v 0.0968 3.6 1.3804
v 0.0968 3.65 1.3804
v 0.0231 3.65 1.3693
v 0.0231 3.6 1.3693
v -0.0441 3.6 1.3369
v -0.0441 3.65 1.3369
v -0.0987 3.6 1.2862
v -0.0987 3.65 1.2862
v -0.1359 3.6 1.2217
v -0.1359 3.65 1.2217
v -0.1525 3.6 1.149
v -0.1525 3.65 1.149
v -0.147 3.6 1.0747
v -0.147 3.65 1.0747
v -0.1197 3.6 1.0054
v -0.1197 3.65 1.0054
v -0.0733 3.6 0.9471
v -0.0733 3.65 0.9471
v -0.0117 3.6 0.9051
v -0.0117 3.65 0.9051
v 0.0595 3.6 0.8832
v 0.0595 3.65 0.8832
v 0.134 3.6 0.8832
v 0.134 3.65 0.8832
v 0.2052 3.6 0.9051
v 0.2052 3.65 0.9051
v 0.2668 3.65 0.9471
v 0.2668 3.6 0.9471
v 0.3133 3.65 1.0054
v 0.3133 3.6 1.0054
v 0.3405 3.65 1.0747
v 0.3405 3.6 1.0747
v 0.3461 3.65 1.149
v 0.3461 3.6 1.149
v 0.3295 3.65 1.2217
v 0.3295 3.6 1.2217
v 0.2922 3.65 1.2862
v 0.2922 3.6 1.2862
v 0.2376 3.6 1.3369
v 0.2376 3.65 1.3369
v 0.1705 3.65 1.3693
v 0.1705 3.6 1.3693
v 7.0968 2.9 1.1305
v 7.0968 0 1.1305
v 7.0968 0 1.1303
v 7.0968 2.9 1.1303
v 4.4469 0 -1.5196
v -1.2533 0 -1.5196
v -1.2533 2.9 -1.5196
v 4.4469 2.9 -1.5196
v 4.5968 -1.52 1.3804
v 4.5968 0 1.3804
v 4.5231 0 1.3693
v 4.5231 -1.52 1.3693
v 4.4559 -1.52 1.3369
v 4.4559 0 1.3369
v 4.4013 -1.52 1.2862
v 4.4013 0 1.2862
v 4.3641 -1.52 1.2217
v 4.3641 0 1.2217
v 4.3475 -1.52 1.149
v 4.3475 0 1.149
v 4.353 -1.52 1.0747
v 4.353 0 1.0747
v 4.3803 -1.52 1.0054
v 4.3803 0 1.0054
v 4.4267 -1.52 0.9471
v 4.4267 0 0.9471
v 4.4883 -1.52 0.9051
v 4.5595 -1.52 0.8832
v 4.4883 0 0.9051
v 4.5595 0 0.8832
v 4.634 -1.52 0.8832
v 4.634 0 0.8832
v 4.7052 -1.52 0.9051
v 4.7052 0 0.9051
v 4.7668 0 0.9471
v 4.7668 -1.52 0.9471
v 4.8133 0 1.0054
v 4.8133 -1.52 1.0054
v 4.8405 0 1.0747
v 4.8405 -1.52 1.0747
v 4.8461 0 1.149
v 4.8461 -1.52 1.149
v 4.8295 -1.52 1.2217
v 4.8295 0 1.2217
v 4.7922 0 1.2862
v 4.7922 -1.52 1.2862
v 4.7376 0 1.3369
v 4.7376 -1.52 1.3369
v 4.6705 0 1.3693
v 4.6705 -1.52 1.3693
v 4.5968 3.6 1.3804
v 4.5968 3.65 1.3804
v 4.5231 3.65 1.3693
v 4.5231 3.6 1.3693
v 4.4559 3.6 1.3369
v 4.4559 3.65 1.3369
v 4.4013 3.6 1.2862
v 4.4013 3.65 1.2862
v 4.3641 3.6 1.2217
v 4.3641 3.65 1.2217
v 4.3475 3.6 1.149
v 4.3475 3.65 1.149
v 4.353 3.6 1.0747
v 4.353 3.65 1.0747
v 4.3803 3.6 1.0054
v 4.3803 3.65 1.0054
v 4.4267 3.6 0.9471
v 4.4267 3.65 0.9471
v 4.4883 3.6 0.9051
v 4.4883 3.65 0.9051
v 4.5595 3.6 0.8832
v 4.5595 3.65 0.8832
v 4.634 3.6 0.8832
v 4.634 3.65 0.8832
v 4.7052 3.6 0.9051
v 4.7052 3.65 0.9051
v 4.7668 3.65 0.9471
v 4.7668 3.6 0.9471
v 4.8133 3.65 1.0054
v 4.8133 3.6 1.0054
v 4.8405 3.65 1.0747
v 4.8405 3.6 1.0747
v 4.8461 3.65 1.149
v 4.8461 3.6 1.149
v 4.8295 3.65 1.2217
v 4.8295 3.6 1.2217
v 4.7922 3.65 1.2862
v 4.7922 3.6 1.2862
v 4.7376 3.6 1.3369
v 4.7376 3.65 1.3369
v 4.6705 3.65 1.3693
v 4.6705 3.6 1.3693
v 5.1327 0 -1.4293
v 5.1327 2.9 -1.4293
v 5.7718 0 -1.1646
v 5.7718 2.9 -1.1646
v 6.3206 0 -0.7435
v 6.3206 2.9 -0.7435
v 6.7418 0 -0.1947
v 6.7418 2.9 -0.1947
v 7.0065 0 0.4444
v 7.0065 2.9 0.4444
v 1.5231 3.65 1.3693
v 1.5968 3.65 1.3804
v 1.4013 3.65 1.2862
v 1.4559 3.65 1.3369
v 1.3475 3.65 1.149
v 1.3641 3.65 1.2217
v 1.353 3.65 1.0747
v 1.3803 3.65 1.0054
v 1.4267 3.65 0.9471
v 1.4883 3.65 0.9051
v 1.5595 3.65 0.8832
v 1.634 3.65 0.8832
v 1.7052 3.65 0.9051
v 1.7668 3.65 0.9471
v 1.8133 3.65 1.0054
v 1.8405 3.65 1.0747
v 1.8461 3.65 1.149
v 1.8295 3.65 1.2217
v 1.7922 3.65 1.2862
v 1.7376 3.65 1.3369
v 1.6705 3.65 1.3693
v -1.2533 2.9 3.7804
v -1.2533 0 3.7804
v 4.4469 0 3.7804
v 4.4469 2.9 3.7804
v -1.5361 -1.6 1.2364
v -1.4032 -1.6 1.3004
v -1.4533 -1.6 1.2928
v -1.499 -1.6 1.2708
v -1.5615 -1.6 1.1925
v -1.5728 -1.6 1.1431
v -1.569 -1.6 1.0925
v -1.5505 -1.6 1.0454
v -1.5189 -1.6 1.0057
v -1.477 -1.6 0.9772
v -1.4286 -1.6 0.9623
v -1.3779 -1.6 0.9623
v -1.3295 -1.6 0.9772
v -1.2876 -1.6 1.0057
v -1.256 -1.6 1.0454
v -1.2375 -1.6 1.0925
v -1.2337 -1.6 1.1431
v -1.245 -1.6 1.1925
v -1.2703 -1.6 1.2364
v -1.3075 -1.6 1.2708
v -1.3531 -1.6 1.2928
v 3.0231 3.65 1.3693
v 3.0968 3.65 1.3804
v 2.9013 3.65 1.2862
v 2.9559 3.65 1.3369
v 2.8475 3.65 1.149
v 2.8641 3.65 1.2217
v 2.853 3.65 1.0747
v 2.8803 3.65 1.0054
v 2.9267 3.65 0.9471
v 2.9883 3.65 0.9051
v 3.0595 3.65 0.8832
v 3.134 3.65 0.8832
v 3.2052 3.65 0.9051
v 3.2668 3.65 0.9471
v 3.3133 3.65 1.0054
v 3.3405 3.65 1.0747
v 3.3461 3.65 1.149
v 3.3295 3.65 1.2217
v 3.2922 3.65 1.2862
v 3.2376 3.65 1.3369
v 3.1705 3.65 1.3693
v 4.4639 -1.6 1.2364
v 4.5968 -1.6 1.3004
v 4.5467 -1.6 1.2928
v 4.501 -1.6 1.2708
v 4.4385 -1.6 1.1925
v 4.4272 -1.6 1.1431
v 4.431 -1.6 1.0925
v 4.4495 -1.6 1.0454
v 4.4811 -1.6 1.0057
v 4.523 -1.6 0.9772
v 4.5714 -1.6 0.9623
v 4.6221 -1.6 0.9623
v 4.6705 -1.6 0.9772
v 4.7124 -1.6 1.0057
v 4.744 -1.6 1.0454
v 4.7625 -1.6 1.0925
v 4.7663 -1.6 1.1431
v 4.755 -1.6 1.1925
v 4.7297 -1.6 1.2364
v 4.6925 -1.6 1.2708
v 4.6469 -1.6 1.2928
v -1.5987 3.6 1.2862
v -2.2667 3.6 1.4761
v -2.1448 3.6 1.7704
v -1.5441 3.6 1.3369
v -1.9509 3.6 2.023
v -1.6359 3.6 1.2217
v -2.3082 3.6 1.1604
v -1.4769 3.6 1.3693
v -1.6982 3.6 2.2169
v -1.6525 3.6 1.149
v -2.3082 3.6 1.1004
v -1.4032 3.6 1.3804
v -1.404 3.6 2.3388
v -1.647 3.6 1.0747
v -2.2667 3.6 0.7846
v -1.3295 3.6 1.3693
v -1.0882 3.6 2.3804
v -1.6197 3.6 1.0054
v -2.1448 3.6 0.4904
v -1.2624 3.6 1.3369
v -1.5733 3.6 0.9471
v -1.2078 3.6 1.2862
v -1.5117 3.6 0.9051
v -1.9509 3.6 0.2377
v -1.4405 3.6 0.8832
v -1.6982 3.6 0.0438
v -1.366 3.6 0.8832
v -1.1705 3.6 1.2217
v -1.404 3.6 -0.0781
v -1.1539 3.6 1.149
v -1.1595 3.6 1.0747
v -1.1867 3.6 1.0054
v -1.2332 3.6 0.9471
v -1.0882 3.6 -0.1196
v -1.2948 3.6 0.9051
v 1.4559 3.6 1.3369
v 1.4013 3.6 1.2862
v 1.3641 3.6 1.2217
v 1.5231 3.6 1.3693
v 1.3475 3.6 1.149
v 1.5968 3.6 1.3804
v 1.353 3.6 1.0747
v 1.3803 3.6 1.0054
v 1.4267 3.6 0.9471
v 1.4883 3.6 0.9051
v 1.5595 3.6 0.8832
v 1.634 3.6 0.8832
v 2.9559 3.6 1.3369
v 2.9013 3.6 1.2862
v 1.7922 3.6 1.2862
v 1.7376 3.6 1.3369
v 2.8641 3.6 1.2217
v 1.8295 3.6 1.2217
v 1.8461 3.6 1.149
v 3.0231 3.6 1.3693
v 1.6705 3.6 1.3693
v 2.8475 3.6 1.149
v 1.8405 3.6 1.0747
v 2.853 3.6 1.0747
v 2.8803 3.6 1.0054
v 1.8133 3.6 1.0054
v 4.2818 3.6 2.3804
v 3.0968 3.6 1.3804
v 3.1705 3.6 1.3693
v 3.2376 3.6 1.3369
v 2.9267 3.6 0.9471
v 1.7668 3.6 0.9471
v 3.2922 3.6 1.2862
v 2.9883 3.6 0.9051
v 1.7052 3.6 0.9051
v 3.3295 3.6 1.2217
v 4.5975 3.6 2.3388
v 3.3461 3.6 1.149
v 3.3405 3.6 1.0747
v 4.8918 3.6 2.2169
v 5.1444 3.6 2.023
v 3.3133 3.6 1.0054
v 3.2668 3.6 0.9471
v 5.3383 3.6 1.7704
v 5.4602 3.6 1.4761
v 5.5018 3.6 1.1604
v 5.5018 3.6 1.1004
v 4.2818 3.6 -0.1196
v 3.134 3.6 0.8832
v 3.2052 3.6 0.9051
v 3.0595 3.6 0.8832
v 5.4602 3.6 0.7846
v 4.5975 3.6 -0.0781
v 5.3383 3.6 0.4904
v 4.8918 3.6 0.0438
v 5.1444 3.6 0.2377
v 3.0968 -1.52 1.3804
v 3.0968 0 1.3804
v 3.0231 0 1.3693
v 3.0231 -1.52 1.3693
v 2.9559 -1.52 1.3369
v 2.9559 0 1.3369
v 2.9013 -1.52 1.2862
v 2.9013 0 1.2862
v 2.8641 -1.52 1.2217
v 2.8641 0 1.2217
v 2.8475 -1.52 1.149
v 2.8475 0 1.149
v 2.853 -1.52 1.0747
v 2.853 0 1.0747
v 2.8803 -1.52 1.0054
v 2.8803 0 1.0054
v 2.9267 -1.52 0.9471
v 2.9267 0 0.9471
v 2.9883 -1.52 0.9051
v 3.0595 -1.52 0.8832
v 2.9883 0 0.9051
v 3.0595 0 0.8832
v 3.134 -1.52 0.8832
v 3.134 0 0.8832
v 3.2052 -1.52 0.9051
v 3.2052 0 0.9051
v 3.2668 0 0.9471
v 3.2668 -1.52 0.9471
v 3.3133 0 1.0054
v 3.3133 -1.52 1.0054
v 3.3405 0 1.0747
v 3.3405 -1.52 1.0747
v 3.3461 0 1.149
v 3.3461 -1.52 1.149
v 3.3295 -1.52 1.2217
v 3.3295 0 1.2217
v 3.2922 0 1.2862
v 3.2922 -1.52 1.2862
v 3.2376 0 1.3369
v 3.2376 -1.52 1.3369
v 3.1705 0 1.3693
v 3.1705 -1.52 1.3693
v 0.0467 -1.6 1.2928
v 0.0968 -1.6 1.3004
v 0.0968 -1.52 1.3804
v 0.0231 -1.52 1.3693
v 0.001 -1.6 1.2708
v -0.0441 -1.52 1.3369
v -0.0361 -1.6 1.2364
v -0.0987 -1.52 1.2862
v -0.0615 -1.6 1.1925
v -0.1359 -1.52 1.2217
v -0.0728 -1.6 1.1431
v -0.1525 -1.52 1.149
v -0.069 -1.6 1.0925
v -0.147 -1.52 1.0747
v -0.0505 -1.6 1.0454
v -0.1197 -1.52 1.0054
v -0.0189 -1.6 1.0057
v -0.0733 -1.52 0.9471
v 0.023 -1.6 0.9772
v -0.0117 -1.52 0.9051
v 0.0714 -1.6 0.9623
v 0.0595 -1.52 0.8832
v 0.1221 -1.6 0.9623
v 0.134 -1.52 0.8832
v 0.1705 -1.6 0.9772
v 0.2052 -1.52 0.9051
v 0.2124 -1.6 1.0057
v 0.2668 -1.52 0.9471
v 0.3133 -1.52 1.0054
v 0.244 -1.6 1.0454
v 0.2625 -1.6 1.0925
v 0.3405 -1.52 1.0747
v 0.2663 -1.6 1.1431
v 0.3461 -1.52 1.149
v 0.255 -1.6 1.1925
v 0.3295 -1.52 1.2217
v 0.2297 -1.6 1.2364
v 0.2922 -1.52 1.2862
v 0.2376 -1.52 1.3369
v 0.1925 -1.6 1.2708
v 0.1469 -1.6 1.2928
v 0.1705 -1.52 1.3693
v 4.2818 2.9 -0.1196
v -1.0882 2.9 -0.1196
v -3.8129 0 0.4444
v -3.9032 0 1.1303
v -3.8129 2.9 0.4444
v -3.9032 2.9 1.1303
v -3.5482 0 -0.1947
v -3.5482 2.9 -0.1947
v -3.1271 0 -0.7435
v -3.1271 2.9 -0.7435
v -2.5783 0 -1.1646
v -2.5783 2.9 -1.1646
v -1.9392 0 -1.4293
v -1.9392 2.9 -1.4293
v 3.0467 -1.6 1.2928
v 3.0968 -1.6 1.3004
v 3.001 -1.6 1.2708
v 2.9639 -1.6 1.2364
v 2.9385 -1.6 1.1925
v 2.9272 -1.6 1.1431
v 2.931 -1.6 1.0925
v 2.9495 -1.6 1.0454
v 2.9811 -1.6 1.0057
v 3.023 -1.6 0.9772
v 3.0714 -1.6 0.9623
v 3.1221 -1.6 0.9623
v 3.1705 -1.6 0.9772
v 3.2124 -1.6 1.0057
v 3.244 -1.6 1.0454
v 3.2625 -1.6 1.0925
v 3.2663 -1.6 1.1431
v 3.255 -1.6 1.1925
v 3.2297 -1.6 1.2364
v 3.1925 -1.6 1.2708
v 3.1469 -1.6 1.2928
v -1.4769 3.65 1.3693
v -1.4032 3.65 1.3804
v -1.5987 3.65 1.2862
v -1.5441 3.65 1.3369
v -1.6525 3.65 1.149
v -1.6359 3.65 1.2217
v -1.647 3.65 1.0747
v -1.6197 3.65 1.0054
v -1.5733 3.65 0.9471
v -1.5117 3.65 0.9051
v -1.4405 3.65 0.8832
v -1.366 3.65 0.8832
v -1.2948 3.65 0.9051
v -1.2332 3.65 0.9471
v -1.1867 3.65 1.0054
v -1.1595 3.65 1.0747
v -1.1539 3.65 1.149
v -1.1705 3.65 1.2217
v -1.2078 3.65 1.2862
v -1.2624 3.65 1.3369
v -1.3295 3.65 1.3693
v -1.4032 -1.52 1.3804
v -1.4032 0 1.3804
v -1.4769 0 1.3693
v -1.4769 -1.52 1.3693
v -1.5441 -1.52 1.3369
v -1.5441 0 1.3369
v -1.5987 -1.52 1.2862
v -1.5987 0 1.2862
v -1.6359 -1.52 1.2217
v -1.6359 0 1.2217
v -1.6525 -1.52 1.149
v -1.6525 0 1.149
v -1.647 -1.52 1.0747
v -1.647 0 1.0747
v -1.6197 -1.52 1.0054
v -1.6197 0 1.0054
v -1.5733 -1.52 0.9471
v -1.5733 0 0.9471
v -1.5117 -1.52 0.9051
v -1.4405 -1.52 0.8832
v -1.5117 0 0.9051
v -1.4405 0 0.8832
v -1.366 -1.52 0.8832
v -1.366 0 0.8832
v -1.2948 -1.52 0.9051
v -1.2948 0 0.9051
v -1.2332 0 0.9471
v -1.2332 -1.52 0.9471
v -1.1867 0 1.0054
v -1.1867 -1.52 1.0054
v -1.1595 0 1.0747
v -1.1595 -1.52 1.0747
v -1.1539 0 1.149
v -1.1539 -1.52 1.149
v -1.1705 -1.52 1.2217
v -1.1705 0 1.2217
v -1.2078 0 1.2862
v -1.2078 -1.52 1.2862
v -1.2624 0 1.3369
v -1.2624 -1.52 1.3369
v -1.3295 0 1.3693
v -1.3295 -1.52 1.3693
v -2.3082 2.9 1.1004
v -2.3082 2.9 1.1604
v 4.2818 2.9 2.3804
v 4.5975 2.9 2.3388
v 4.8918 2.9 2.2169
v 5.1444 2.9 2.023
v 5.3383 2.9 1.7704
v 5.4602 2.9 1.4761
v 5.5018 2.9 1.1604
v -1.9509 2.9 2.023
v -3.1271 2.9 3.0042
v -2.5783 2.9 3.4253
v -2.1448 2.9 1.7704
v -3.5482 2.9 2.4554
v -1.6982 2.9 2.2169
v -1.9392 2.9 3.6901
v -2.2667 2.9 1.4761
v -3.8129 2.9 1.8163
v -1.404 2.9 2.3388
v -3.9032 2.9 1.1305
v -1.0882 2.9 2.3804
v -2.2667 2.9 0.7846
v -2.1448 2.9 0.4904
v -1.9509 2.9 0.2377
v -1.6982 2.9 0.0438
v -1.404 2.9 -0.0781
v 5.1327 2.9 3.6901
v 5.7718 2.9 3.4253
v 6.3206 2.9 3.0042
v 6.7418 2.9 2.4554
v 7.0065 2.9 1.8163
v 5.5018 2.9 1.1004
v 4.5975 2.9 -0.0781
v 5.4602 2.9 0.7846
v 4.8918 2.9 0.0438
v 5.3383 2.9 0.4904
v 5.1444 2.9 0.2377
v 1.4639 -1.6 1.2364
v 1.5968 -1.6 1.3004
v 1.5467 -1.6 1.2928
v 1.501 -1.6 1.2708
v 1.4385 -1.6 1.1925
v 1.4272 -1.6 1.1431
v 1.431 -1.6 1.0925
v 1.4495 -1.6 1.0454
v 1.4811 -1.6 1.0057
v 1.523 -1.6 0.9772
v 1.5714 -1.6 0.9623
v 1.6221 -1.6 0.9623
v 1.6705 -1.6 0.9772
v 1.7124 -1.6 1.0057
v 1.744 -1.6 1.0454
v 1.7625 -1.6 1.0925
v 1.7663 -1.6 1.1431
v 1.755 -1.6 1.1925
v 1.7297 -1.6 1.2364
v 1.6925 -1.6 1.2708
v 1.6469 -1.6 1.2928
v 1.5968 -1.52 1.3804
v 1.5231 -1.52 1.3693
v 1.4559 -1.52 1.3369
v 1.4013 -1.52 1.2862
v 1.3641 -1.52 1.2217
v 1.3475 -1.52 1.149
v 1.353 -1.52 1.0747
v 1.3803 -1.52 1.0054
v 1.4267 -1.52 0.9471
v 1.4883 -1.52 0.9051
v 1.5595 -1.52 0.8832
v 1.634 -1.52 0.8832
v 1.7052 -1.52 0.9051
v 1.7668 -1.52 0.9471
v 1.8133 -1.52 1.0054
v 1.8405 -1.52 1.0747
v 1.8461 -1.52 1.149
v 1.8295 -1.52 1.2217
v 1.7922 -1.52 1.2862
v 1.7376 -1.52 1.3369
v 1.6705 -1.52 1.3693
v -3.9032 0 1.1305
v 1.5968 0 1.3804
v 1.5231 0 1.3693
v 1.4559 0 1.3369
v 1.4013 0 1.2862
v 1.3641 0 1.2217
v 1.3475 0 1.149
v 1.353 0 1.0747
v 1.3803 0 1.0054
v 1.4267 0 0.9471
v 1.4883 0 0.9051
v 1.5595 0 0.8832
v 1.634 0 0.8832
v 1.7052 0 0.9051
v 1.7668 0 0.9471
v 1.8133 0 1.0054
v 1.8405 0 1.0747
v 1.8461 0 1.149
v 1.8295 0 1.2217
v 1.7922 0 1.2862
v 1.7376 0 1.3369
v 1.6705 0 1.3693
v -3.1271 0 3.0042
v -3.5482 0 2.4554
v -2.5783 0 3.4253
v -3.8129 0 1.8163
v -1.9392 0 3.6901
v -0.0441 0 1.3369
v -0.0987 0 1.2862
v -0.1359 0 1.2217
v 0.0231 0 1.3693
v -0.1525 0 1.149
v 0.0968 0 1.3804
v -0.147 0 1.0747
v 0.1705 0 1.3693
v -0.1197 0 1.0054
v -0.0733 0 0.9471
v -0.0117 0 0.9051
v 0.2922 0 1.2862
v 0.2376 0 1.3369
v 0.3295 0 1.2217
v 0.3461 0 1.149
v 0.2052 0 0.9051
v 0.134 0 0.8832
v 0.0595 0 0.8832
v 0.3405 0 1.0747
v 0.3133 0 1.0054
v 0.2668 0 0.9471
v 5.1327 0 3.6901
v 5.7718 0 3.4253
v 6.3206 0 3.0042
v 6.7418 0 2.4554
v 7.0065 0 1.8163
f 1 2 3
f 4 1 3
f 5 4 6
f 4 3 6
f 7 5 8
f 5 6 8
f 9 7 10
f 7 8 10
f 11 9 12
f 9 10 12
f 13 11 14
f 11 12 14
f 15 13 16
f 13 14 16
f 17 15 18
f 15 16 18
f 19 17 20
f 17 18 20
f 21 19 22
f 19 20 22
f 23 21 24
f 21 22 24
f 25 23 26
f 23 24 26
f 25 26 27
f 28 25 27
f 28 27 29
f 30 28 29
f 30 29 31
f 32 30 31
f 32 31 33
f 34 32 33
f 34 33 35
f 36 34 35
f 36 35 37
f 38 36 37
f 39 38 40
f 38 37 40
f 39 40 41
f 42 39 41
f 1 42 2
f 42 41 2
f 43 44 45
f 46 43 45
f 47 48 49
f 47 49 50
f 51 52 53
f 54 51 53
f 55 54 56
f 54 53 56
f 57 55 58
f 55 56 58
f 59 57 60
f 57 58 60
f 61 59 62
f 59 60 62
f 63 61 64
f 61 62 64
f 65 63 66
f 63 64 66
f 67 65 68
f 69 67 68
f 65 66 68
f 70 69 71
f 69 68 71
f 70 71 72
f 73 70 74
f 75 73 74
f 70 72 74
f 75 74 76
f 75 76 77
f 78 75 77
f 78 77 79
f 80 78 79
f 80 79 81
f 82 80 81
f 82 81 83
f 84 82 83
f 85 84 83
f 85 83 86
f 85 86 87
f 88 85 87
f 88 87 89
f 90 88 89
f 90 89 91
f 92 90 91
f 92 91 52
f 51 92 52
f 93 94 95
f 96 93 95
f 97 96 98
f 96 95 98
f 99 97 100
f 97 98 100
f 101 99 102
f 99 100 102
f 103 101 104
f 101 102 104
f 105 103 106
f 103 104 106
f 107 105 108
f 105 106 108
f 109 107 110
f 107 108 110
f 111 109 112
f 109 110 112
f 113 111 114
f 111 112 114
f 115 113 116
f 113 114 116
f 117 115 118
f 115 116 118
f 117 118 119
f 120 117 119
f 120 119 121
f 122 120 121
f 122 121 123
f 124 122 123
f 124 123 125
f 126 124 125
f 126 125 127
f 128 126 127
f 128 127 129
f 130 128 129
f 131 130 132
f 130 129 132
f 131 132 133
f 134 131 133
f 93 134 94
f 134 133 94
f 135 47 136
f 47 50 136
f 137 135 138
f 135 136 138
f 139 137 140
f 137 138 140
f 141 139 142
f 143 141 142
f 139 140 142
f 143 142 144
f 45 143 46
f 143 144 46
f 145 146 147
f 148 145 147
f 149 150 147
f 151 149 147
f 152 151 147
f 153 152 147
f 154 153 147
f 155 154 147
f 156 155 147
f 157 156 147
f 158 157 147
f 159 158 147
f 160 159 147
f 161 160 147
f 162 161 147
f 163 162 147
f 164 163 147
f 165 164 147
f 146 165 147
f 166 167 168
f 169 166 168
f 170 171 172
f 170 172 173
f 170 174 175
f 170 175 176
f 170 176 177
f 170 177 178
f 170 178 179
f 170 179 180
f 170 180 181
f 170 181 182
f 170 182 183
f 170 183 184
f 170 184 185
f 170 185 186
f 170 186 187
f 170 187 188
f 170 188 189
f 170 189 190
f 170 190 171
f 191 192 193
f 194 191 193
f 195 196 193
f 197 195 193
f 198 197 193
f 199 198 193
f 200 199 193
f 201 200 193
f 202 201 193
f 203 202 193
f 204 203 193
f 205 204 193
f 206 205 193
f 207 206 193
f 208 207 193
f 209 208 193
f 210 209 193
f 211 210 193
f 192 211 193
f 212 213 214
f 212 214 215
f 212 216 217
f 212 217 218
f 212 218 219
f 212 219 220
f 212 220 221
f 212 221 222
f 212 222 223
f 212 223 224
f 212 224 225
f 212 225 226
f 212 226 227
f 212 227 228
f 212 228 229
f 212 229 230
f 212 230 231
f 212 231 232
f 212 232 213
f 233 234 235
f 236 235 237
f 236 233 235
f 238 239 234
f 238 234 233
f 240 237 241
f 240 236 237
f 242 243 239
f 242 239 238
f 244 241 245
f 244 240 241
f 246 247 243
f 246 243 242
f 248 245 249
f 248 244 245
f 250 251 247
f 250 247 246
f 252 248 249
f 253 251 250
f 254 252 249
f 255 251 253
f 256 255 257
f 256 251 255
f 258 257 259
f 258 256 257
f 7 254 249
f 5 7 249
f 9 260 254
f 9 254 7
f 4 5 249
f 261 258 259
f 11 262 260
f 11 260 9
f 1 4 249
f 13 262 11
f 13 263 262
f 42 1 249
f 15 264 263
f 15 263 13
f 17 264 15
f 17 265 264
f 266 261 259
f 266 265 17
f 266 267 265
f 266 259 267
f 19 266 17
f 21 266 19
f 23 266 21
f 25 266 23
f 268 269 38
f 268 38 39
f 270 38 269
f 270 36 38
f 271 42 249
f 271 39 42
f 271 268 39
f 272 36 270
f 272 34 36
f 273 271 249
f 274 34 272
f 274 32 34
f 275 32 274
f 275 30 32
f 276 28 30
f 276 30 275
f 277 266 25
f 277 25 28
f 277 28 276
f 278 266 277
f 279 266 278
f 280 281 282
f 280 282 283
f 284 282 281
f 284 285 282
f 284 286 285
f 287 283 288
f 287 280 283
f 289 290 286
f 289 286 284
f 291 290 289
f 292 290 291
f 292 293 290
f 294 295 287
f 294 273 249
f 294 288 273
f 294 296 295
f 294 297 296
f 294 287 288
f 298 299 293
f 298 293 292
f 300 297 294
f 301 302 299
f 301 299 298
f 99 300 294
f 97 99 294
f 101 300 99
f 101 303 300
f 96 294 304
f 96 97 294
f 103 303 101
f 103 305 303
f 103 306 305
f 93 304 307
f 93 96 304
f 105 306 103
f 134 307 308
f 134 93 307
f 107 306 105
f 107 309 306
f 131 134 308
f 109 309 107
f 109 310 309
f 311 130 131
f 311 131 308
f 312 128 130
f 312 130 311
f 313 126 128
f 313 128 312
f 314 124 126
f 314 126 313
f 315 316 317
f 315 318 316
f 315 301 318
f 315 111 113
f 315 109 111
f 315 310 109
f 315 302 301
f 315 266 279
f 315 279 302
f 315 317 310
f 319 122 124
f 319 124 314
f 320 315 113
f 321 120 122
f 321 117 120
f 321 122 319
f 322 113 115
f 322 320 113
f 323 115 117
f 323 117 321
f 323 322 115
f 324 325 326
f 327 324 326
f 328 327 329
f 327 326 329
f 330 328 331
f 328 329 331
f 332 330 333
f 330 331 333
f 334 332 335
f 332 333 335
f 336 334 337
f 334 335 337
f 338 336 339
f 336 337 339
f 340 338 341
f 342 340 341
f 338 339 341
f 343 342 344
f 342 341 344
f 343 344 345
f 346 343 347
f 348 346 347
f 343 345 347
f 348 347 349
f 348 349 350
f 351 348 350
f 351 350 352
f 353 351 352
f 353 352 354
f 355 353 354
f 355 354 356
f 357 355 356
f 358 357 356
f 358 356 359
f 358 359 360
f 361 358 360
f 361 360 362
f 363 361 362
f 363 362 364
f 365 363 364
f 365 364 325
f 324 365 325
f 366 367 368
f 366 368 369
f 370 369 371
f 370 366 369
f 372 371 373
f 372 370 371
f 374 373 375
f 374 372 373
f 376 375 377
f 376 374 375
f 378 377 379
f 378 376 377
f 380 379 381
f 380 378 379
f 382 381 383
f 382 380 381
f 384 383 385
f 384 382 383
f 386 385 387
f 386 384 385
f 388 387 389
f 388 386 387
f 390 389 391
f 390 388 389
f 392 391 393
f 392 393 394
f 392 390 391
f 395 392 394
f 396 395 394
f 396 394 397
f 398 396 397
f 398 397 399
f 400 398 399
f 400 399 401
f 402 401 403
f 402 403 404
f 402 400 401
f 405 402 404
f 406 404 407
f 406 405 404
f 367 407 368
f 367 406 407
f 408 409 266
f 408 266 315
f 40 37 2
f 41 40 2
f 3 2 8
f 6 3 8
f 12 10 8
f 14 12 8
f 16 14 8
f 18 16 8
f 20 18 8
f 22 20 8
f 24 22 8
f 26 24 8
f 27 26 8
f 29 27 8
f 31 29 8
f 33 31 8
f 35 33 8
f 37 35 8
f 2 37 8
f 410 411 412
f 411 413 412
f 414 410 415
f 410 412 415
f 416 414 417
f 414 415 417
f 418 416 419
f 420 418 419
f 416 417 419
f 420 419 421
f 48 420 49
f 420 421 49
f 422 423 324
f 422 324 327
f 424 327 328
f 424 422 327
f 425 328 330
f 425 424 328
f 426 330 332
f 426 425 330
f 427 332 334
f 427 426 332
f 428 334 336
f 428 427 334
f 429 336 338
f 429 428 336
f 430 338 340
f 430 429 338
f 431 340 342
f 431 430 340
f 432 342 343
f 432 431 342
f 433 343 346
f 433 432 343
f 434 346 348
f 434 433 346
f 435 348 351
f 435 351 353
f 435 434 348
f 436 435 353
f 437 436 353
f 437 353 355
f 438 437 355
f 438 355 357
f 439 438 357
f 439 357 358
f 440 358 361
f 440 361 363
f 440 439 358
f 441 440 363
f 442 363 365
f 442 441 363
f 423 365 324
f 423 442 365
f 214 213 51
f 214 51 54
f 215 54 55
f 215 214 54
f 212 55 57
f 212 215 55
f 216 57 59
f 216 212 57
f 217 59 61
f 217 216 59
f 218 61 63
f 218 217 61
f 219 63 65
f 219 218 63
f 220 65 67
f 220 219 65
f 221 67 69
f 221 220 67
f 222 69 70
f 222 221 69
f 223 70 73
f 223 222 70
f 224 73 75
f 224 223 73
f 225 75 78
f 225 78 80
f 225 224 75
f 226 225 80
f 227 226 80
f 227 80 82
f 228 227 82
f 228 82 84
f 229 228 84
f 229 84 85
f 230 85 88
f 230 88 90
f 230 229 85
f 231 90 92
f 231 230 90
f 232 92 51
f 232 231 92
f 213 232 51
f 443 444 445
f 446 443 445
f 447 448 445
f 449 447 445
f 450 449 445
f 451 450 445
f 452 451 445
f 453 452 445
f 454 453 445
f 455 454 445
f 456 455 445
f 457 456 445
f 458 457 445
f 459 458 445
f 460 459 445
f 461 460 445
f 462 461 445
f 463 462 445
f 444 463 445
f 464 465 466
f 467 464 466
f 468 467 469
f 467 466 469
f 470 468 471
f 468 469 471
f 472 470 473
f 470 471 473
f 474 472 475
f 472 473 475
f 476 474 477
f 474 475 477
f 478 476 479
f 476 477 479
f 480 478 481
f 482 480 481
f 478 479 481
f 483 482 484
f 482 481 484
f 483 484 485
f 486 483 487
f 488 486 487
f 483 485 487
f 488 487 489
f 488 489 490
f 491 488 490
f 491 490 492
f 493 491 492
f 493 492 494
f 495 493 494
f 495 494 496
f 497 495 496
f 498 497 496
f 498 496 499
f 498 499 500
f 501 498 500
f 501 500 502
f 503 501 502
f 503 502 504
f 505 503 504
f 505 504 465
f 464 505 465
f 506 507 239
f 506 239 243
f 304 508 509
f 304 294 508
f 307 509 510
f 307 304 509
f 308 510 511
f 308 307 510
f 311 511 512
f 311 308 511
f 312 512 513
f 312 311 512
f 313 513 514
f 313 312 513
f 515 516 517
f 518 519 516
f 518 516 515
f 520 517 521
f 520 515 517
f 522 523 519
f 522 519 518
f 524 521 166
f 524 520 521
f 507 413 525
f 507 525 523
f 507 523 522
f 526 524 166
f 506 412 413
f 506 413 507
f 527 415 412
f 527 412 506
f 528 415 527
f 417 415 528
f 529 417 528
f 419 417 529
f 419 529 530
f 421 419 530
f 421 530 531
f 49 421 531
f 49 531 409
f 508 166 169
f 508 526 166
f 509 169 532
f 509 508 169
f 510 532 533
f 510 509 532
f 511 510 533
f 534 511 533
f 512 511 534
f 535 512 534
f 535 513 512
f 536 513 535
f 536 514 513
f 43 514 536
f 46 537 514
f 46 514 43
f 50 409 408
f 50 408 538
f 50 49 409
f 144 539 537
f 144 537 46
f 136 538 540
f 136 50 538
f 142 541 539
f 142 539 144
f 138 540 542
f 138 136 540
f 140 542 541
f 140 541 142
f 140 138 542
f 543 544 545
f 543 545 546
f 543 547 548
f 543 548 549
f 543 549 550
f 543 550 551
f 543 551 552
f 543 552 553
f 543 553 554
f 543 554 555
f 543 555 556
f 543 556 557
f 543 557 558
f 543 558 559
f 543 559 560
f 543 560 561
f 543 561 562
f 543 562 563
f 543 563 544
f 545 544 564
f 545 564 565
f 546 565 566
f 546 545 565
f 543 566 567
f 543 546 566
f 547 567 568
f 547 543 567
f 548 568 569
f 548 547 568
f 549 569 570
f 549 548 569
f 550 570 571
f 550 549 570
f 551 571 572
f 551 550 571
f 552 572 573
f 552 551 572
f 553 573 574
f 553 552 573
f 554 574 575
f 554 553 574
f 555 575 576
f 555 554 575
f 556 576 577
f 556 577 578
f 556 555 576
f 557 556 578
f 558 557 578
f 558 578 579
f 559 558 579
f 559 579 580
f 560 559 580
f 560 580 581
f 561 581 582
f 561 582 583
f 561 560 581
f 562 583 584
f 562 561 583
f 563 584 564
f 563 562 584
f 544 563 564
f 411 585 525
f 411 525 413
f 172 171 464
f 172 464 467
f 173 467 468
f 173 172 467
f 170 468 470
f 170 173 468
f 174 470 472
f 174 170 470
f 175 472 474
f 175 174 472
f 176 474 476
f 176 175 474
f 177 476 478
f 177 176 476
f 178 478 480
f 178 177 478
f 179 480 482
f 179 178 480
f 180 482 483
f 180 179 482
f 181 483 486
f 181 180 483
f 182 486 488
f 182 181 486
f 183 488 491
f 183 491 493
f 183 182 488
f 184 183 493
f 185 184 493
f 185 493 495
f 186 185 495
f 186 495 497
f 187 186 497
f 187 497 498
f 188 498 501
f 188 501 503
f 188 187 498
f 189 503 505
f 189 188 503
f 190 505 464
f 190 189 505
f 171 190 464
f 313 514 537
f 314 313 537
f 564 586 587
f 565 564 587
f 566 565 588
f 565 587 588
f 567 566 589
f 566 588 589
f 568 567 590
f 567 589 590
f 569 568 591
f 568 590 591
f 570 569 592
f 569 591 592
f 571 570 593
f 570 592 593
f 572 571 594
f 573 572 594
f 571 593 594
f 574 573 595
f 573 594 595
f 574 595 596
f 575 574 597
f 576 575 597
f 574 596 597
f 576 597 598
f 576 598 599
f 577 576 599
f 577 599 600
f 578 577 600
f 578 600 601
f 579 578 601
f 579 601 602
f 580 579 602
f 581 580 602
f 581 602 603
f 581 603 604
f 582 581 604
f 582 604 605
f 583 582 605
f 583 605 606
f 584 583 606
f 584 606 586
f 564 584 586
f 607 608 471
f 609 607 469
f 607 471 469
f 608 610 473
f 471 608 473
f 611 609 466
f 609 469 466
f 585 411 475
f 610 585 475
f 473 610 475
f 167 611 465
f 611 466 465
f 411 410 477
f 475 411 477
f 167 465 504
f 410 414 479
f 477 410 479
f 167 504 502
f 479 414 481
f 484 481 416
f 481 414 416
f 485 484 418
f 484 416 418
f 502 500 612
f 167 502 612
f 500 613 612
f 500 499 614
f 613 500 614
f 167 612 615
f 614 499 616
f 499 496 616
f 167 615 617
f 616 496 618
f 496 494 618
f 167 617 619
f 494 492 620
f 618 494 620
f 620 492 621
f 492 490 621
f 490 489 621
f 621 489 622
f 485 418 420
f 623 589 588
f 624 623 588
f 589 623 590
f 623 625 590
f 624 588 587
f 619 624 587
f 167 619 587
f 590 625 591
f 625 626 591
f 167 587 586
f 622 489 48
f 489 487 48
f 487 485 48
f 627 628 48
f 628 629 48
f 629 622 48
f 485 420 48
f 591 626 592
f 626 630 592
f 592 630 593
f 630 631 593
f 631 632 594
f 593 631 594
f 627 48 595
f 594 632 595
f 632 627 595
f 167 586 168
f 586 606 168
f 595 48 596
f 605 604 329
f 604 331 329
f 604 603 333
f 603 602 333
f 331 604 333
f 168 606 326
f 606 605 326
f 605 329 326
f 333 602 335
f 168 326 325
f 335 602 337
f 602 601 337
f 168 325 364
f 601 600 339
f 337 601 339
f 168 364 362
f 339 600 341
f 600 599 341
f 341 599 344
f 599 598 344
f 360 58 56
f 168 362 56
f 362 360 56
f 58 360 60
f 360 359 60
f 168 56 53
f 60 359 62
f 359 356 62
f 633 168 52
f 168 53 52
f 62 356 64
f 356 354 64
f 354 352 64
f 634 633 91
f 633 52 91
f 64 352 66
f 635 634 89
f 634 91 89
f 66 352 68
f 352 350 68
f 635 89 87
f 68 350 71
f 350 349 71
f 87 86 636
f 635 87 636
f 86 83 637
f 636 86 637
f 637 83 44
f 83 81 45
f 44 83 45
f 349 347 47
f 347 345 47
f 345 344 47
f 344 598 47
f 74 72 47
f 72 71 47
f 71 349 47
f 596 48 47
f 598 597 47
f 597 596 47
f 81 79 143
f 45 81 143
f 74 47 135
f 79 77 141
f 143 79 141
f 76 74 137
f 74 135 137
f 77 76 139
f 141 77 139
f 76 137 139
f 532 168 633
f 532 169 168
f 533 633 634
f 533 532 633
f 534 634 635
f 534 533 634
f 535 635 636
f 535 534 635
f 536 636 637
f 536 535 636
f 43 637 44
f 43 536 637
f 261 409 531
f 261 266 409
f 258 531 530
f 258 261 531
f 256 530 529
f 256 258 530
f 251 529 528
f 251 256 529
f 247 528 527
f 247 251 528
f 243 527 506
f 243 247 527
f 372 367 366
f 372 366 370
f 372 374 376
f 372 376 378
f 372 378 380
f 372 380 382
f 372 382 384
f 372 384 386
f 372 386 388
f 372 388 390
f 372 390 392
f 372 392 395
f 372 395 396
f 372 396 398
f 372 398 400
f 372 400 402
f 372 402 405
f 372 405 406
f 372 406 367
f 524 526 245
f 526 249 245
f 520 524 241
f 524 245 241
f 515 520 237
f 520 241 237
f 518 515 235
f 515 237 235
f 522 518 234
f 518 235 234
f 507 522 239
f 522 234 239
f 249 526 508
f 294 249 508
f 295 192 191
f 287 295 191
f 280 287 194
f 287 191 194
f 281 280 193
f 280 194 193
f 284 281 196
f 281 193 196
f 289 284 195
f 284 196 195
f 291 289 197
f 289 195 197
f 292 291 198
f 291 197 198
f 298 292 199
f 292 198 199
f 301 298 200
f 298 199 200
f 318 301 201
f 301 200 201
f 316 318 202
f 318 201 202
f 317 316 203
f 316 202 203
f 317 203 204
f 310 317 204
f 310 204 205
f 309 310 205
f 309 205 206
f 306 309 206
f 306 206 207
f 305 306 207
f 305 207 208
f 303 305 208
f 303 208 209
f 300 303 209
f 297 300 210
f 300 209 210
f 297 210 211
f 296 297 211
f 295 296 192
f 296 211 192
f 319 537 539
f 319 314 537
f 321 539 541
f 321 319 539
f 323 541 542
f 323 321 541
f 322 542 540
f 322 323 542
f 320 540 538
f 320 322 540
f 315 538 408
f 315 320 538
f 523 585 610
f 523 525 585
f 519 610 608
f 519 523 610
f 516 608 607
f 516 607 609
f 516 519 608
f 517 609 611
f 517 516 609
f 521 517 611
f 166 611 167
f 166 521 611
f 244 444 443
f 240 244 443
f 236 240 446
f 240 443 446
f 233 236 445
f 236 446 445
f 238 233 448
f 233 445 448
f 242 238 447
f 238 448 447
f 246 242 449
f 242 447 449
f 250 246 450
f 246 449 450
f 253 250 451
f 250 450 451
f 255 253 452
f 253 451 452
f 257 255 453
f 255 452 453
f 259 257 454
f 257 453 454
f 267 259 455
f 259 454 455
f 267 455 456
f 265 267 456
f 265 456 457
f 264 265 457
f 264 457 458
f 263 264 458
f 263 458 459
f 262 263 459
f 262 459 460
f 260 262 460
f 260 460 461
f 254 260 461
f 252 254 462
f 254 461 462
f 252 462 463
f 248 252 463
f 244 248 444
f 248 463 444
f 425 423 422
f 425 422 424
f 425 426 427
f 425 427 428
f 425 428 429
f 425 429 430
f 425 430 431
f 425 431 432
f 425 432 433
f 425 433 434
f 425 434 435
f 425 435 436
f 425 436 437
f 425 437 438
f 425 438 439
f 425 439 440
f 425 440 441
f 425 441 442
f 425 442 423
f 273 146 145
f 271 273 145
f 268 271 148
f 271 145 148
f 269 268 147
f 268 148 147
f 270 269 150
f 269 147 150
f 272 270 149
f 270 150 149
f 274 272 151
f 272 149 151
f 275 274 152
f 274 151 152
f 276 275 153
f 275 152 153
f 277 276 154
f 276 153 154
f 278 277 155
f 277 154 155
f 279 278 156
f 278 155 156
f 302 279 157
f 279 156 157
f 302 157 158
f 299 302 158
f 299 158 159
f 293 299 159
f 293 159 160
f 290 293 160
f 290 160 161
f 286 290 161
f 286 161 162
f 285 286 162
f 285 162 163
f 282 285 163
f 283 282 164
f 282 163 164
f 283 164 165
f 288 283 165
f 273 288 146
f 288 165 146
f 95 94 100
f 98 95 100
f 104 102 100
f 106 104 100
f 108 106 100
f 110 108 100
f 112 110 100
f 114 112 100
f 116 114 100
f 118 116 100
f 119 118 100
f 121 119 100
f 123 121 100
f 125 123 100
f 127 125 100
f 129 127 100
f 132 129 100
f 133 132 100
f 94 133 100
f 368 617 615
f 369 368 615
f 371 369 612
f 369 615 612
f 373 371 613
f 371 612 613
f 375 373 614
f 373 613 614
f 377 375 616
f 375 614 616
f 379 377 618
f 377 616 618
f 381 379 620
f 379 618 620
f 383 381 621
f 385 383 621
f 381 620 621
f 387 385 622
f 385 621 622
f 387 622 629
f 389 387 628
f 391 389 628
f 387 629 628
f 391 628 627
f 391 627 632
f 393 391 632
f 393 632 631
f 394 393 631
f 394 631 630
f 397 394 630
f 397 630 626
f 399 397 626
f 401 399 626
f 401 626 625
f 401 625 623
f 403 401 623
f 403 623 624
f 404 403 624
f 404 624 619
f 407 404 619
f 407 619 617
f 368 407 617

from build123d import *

# Parameters (mm, degrees)
SKETCH1_W                = 11
SKETCH1_H                = 5.3
BOSS_EXTRUDE1_DEPTH      = 2.9
SKETCH2_W                = 7.81
SKETCH2_H                = 2.5
BOSS_EXTRUDE2_DEPTH      = 0.7
BOSS_EXTRUDE3_DEPTH      = 1.6
BOSS_EXTRUDE3_DEPTH_BACK = 3.65
SKETCH3_R                = 0.25
CHAMFER1_SIZE            = 0.08
FILLET1_R                = 2.65
FILLET2_R                = 1.22


with BuildPart() as part:
    # Sketch1 → Boss-Extrude1 (new body)
    with BuildSketch(Plane(origin=(0, 0, 0), x_dir=(1, 0, 0), z_dir=(0, 1, 0))):
        with Locations((1.596774194, -1.130364656)):
            Rectangle(SKETCH1_W, SKETCH1_H)
    extrude(amount=BOSS_EXTRUDE1_DEPTH)

    # Sketch2 → Boss-Extrude2 (add)
    with BuildSketch(Plane(origin=(0, 2.9, 0), x_dir=(1, 0, 0), z_dir=(0, 1, 0))):
        with Locations((1.596774194, -1.130364656)):
            Rectangle(SKETCH2_W, SKETCH2_H)
    extrude(amount=BOSS_EXTRUDE2_DEPTH)

    # Sketch3 → Boss-Extrude3 (add, two sides: drawn at the far end of the back side and taken through both)
    with BuildSketch(Plane.XZ.offset(-BOSS_EXTRUDE3_DEPTH_BACK)):
        with Locations(Location((1.596774194, 1.130364656, 0), (0, 0, 90))):
            Circle(SKETCH3_R)
        with Locations(Location((3.096774194, 1.130364656, 0), (0, 0, 90))):
            Circle(SKETCH3_R)
        with Locations(Location((4.596774194, 1.130364656, 0), (0, 0, 90))):
            Circle(SKETCH3_R)
        with Locations(Location((0.096774194, 1.130364656, 0), (0, 0, 90))):
            Circle(SKETCH3_R)
        with Locations(Location((-1.403225806, 1.130364656, 0), (0, 0, 90))):
            Circle(SKETCH3_R)
    extrude(amount=BOSS_EXTRUDE3_DEPTH + BOSS_EXTRUDE3_DEPTH_BACK)

    # Chamfer1
    chamfer1_edges = [part.edges().sort_by_distance(p)[0] for p in [
        (1.596774194, -1.6, 0.880364656),
        (3.096774194, -1.6, 0.880364656),
        (4.596774194, -1.6, 0.880364656),
        (0.096774194, -1.6, 0.880364656),
        (-1.403225806, -1.6, 0.880364656),
    ]]
    chamfer(chamfer1_edges, length=CHAMFER1_SIZE)

    # Fillet1
    fillet1_edges = [part.edges().sort_by_distance(p)[0] for p in [
        (-3.903225806, 1.45, -1.519635344),
        (-3.903225806, 1.45, 3.780364656),
        (7.096774194, 1.45, 3.780364656),
        (7.096774194, 1.45, -1.519635344),
    ]]
    fillet(fillet1_edges, radius=FILLET1_R - 0.0001)  # a hair under: the kernel refuses the full size

    # Fillet2
    fillet2_edges = [part.edges().sort_by_distance(p)[0] for p in [
        (-2.308225806, 3.25, -0.119635344),
        (-2.308225806, 3.25, 2.380364656),
        (5.501774194, 3.25, 2.380364656),
        (5.501774194, 3.25, -0.119635344),
    ]]
    fillet(fillet2_edges, radius=FILLET2_R)


solid = part.part
